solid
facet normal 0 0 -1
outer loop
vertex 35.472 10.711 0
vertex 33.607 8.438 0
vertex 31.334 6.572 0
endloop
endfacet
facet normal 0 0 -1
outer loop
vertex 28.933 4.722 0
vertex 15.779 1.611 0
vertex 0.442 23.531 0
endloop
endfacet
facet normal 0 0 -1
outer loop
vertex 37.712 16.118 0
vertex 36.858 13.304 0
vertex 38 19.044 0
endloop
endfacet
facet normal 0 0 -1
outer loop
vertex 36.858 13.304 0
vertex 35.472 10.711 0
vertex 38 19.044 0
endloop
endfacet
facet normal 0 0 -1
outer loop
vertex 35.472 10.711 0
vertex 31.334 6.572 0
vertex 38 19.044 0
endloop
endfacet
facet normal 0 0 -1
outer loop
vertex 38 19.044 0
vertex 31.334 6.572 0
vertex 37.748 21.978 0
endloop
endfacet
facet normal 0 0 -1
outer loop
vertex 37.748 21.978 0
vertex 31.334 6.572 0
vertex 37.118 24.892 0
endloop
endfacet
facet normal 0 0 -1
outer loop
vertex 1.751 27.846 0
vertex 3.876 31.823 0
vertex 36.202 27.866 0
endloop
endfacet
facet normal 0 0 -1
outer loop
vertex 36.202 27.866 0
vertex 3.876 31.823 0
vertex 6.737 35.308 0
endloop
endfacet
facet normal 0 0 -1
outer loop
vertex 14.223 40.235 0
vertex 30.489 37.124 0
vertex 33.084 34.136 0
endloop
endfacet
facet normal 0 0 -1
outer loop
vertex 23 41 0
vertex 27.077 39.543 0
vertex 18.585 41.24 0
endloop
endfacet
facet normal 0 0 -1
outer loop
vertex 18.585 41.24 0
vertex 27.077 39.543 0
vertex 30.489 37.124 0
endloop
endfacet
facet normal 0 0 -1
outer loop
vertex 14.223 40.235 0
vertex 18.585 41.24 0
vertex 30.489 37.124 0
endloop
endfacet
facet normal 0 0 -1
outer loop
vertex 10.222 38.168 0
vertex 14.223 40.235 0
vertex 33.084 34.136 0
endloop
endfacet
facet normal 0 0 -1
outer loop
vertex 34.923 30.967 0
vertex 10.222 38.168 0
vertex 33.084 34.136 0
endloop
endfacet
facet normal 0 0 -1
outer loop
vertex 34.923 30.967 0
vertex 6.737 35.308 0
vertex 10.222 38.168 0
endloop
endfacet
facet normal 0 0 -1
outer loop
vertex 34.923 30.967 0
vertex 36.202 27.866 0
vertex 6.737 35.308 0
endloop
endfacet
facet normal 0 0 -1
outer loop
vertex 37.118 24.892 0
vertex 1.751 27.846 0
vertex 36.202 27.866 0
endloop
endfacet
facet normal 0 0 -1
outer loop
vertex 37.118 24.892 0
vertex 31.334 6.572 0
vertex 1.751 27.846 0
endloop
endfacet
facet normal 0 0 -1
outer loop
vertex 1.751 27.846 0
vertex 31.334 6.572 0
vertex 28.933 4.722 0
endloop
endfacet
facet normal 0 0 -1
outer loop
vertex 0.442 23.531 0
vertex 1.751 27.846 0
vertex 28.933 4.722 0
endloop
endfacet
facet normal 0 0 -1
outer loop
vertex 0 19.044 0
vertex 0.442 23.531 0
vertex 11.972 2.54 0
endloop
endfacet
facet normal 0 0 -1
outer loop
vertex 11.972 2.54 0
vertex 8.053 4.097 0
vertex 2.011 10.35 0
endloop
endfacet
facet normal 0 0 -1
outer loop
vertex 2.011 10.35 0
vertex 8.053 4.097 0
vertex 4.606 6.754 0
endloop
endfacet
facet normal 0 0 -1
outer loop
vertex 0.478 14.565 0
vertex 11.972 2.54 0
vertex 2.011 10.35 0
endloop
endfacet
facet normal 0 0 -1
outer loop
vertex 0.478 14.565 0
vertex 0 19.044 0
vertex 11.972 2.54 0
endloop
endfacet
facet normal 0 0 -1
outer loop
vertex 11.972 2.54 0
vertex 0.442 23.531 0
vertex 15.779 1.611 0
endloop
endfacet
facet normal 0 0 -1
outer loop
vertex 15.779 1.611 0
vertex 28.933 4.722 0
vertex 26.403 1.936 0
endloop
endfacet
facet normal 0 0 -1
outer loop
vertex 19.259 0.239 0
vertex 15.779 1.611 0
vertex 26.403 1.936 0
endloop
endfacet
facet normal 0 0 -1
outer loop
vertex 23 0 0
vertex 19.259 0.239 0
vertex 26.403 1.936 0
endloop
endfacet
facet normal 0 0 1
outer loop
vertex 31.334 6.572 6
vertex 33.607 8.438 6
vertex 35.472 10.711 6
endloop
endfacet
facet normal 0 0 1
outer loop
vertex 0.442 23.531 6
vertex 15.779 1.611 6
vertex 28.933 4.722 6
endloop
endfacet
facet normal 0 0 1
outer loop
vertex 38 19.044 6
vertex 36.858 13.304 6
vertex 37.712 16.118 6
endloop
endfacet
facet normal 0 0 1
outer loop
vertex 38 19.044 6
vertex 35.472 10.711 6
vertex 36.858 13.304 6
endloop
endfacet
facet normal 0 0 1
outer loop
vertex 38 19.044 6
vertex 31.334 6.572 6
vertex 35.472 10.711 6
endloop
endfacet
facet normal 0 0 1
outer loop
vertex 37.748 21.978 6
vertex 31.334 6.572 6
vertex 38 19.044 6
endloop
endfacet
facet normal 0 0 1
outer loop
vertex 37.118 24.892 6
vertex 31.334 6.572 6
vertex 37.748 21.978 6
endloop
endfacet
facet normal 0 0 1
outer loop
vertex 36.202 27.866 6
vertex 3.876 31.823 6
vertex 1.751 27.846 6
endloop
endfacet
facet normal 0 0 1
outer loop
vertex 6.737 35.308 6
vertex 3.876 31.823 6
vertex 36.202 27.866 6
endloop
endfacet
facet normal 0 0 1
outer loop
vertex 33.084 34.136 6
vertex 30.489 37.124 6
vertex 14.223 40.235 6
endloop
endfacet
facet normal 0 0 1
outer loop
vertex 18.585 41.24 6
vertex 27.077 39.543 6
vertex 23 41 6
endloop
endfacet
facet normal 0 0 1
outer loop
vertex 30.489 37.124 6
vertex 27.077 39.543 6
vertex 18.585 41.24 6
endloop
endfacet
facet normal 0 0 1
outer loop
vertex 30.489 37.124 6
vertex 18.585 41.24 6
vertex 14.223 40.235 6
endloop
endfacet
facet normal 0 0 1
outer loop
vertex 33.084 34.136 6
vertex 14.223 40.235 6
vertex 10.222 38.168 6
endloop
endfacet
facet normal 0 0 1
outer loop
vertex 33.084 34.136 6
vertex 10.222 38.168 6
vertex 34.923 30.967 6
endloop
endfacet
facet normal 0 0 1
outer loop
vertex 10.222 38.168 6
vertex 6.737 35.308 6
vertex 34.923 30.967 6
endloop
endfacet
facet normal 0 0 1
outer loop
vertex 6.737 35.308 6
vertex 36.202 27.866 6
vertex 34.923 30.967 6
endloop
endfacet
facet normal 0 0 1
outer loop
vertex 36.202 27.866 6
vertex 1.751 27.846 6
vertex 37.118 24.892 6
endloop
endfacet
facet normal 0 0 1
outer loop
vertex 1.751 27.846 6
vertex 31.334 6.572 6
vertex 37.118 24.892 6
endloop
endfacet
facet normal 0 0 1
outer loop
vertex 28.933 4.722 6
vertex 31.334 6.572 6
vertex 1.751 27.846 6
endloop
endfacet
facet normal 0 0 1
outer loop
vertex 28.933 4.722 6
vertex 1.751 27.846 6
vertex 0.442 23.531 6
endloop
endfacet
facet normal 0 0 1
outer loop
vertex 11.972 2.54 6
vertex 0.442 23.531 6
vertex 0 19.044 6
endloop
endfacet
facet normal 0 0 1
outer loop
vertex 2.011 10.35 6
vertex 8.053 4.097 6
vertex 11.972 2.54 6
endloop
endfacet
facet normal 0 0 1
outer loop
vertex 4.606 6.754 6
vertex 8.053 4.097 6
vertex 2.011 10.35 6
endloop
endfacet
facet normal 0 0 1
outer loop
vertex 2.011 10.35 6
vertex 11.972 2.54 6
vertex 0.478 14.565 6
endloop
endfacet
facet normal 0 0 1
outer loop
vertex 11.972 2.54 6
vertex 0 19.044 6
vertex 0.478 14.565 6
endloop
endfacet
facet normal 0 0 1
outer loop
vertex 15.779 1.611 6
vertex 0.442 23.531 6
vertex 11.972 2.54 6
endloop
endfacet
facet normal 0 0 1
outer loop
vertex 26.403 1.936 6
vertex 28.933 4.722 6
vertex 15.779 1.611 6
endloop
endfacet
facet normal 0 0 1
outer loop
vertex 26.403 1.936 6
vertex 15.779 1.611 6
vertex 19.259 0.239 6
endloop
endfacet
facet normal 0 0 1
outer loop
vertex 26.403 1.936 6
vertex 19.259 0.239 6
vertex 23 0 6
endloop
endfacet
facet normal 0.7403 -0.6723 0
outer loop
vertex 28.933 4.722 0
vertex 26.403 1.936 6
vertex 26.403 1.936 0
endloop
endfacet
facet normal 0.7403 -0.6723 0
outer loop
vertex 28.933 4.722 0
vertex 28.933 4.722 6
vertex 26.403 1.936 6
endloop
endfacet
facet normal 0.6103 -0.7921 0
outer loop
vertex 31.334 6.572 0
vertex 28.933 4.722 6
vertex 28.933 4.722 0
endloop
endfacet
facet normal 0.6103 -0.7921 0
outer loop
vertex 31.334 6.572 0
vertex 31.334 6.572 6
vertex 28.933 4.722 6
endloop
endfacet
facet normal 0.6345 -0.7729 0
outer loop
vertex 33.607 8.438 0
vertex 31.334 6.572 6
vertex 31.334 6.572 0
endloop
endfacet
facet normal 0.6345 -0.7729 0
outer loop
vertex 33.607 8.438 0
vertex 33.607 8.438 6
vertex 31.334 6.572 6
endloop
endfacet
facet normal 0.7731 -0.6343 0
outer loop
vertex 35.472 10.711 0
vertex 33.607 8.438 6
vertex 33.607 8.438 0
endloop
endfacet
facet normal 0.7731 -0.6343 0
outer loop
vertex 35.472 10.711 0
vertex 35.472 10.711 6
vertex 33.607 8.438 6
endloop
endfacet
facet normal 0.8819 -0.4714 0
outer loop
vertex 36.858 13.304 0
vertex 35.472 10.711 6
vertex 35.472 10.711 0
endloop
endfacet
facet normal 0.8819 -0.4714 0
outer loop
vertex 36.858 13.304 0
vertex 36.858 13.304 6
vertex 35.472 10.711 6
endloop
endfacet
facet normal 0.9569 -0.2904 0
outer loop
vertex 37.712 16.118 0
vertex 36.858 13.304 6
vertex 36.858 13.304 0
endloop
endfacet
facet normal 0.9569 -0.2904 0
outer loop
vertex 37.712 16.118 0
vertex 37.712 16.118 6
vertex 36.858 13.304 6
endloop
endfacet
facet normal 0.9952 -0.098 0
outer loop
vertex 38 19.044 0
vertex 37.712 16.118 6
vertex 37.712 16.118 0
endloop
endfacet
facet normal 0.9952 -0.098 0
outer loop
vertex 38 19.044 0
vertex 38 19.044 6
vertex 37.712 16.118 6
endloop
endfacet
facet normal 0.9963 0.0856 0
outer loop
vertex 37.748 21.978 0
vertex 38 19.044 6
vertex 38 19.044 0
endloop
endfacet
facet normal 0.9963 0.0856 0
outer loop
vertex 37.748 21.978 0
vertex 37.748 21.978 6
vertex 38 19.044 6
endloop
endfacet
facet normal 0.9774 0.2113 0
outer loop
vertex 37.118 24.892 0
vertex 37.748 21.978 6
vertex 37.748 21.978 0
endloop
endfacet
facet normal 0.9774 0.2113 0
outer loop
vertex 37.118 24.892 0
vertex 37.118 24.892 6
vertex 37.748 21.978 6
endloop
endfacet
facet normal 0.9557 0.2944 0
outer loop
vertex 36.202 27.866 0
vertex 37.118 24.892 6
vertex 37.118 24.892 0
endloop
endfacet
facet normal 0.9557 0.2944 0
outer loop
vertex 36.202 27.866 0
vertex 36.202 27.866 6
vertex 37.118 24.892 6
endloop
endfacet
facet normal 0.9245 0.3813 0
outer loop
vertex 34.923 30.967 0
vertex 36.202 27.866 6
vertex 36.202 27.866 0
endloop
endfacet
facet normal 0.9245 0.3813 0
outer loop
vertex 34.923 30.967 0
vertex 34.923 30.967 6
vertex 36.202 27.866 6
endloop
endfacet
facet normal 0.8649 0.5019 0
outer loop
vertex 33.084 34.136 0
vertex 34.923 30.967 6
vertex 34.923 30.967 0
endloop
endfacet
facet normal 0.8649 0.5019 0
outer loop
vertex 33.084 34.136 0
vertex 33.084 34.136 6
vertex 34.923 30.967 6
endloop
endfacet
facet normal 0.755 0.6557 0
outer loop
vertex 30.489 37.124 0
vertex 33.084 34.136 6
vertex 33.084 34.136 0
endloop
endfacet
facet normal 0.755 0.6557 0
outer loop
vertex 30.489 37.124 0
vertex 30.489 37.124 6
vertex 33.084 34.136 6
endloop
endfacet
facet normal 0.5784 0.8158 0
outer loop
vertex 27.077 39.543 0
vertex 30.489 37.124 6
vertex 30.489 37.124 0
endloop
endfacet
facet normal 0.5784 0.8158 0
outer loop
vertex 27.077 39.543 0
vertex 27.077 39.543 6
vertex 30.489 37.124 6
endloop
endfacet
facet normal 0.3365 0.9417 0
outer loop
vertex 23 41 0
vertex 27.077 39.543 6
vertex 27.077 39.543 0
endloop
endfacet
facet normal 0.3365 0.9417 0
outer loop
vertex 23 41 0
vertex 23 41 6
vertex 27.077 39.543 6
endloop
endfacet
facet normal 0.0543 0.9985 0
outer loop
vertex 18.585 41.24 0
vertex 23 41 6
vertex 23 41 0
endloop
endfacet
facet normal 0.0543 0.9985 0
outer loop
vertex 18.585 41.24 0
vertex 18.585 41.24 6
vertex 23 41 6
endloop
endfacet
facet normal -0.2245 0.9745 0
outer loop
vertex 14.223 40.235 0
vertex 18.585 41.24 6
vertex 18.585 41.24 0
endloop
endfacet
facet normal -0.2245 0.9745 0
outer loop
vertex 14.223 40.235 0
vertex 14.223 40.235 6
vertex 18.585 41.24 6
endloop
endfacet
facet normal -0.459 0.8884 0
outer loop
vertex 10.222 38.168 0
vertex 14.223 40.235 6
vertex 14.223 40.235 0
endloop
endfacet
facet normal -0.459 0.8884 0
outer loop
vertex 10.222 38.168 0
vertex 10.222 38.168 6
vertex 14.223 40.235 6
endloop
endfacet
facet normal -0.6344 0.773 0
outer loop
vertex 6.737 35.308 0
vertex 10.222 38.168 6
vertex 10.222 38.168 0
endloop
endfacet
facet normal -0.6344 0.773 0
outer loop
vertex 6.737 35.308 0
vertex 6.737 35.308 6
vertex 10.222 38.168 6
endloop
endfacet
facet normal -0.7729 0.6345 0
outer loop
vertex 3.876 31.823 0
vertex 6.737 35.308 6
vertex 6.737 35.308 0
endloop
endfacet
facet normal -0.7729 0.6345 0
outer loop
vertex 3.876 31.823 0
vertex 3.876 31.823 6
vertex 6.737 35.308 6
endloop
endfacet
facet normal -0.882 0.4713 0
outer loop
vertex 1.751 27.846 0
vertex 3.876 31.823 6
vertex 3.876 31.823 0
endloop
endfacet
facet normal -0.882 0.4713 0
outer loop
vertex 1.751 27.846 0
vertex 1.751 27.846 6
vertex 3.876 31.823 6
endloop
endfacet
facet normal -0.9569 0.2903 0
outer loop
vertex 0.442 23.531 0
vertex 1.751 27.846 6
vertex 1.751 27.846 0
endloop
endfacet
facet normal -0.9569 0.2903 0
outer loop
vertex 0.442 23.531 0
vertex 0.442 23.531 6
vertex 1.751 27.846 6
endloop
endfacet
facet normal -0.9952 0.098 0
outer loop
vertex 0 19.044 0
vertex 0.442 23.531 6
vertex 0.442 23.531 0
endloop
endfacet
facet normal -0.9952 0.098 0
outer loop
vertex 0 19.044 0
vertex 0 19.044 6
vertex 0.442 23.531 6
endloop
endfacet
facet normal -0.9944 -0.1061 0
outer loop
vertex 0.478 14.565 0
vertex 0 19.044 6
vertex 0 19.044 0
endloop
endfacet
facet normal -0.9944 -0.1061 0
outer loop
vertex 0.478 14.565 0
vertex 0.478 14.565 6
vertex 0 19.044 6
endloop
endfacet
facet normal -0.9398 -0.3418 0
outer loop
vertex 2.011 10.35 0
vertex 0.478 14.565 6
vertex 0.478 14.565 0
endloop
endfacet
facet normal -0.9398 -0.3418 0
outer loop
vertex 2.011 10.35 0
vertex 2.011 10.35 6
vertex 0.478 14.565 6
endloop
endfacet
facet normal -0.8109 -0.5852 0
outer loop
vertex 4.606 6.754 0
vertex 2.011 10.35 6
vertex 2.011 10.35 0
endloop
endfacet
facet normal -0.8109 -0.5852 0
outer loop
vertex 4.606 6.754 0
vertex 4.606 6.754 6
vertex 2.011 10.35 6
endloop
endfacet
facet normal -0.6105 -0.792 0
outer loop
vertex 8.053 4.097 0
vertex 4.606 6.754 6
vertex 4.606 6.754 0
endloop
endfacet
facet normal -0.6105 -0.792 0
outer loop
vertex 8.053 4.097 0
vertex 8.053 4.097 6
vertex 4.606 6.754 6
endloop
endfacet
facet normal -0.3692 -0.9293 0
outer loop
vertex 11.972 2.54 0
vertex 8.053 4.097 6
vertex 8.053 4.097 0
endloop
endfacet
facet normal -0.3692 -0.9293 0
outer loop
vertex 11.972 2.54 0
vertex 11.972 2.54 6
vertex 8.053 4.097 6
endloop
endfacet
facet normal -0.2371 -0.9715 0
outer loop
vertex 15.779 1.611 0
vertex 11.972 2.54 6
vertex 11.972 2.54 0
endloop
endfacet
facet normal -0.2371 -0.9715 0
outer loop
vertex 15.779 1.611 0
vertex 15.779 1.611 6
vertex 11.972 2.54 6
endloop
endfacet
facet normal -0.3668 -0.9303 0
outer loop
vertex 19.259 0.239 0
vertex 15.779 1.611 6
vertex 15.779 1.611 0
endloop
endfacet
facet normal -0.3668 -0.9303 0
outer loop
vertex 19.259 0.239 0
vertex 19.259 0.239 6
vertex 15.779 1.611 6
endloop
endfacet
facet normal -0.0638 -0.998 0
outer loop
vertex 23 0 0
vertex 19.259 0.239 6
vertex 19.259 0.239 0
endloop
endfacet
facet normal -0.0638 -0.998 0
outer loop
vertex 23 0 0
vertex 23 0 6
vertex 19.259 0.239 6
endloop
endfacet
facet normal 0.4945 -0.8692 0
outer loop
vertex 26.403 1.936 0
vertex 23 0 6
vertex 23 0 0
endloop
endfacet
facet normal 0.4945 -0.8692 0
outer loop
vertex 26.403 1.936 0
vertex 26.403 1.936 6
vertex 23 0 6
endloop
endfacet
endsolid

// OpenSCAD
$fn = 32;

// ----------------------------------------------------------------------
// Cam disc: base radius 15.0 mm, lift 8.0 mm, 32 profile points
// ----------------------------------------------------------------------

// --- parameters (mm) ---
profile_height = 6;       // extrusion height
profile_points = 32;      // points of the closed outline

profile = [[38, 19.044], [37.748, 21.978], [37.118, 24.892], [36.202, 27.866], [34.923, 30.967], [33.084, 34.136], [30.489, 37.124], [27.077, 39.543], [23, 41], [18.585, 41.24], [14.223, 40.235], [10.222, 38.168], [6.737, 35.308], [3.876, 31.823], [1.751, 27.846], [0.442, 23.531], [0, 19.044], [0.478, 14.565], [2.011, 10.35], [4.606, 6.754], [8.053, 4.097], [11.972, 2.54], [15.779, 1.611], [19.259, 0.239], [23, 0], [26.403, 1.936], [28.933, 4.722], [31.334, 6.572], [33.607, 8.438], [35.472, 10.711], [36.858, 13.304], [37.712, 16.118]];  // single closed polygon, 32 points, counter clockwise

// --- the one profile operation ---
linear_extrude(height = profile_height) polygon(points = profile);
